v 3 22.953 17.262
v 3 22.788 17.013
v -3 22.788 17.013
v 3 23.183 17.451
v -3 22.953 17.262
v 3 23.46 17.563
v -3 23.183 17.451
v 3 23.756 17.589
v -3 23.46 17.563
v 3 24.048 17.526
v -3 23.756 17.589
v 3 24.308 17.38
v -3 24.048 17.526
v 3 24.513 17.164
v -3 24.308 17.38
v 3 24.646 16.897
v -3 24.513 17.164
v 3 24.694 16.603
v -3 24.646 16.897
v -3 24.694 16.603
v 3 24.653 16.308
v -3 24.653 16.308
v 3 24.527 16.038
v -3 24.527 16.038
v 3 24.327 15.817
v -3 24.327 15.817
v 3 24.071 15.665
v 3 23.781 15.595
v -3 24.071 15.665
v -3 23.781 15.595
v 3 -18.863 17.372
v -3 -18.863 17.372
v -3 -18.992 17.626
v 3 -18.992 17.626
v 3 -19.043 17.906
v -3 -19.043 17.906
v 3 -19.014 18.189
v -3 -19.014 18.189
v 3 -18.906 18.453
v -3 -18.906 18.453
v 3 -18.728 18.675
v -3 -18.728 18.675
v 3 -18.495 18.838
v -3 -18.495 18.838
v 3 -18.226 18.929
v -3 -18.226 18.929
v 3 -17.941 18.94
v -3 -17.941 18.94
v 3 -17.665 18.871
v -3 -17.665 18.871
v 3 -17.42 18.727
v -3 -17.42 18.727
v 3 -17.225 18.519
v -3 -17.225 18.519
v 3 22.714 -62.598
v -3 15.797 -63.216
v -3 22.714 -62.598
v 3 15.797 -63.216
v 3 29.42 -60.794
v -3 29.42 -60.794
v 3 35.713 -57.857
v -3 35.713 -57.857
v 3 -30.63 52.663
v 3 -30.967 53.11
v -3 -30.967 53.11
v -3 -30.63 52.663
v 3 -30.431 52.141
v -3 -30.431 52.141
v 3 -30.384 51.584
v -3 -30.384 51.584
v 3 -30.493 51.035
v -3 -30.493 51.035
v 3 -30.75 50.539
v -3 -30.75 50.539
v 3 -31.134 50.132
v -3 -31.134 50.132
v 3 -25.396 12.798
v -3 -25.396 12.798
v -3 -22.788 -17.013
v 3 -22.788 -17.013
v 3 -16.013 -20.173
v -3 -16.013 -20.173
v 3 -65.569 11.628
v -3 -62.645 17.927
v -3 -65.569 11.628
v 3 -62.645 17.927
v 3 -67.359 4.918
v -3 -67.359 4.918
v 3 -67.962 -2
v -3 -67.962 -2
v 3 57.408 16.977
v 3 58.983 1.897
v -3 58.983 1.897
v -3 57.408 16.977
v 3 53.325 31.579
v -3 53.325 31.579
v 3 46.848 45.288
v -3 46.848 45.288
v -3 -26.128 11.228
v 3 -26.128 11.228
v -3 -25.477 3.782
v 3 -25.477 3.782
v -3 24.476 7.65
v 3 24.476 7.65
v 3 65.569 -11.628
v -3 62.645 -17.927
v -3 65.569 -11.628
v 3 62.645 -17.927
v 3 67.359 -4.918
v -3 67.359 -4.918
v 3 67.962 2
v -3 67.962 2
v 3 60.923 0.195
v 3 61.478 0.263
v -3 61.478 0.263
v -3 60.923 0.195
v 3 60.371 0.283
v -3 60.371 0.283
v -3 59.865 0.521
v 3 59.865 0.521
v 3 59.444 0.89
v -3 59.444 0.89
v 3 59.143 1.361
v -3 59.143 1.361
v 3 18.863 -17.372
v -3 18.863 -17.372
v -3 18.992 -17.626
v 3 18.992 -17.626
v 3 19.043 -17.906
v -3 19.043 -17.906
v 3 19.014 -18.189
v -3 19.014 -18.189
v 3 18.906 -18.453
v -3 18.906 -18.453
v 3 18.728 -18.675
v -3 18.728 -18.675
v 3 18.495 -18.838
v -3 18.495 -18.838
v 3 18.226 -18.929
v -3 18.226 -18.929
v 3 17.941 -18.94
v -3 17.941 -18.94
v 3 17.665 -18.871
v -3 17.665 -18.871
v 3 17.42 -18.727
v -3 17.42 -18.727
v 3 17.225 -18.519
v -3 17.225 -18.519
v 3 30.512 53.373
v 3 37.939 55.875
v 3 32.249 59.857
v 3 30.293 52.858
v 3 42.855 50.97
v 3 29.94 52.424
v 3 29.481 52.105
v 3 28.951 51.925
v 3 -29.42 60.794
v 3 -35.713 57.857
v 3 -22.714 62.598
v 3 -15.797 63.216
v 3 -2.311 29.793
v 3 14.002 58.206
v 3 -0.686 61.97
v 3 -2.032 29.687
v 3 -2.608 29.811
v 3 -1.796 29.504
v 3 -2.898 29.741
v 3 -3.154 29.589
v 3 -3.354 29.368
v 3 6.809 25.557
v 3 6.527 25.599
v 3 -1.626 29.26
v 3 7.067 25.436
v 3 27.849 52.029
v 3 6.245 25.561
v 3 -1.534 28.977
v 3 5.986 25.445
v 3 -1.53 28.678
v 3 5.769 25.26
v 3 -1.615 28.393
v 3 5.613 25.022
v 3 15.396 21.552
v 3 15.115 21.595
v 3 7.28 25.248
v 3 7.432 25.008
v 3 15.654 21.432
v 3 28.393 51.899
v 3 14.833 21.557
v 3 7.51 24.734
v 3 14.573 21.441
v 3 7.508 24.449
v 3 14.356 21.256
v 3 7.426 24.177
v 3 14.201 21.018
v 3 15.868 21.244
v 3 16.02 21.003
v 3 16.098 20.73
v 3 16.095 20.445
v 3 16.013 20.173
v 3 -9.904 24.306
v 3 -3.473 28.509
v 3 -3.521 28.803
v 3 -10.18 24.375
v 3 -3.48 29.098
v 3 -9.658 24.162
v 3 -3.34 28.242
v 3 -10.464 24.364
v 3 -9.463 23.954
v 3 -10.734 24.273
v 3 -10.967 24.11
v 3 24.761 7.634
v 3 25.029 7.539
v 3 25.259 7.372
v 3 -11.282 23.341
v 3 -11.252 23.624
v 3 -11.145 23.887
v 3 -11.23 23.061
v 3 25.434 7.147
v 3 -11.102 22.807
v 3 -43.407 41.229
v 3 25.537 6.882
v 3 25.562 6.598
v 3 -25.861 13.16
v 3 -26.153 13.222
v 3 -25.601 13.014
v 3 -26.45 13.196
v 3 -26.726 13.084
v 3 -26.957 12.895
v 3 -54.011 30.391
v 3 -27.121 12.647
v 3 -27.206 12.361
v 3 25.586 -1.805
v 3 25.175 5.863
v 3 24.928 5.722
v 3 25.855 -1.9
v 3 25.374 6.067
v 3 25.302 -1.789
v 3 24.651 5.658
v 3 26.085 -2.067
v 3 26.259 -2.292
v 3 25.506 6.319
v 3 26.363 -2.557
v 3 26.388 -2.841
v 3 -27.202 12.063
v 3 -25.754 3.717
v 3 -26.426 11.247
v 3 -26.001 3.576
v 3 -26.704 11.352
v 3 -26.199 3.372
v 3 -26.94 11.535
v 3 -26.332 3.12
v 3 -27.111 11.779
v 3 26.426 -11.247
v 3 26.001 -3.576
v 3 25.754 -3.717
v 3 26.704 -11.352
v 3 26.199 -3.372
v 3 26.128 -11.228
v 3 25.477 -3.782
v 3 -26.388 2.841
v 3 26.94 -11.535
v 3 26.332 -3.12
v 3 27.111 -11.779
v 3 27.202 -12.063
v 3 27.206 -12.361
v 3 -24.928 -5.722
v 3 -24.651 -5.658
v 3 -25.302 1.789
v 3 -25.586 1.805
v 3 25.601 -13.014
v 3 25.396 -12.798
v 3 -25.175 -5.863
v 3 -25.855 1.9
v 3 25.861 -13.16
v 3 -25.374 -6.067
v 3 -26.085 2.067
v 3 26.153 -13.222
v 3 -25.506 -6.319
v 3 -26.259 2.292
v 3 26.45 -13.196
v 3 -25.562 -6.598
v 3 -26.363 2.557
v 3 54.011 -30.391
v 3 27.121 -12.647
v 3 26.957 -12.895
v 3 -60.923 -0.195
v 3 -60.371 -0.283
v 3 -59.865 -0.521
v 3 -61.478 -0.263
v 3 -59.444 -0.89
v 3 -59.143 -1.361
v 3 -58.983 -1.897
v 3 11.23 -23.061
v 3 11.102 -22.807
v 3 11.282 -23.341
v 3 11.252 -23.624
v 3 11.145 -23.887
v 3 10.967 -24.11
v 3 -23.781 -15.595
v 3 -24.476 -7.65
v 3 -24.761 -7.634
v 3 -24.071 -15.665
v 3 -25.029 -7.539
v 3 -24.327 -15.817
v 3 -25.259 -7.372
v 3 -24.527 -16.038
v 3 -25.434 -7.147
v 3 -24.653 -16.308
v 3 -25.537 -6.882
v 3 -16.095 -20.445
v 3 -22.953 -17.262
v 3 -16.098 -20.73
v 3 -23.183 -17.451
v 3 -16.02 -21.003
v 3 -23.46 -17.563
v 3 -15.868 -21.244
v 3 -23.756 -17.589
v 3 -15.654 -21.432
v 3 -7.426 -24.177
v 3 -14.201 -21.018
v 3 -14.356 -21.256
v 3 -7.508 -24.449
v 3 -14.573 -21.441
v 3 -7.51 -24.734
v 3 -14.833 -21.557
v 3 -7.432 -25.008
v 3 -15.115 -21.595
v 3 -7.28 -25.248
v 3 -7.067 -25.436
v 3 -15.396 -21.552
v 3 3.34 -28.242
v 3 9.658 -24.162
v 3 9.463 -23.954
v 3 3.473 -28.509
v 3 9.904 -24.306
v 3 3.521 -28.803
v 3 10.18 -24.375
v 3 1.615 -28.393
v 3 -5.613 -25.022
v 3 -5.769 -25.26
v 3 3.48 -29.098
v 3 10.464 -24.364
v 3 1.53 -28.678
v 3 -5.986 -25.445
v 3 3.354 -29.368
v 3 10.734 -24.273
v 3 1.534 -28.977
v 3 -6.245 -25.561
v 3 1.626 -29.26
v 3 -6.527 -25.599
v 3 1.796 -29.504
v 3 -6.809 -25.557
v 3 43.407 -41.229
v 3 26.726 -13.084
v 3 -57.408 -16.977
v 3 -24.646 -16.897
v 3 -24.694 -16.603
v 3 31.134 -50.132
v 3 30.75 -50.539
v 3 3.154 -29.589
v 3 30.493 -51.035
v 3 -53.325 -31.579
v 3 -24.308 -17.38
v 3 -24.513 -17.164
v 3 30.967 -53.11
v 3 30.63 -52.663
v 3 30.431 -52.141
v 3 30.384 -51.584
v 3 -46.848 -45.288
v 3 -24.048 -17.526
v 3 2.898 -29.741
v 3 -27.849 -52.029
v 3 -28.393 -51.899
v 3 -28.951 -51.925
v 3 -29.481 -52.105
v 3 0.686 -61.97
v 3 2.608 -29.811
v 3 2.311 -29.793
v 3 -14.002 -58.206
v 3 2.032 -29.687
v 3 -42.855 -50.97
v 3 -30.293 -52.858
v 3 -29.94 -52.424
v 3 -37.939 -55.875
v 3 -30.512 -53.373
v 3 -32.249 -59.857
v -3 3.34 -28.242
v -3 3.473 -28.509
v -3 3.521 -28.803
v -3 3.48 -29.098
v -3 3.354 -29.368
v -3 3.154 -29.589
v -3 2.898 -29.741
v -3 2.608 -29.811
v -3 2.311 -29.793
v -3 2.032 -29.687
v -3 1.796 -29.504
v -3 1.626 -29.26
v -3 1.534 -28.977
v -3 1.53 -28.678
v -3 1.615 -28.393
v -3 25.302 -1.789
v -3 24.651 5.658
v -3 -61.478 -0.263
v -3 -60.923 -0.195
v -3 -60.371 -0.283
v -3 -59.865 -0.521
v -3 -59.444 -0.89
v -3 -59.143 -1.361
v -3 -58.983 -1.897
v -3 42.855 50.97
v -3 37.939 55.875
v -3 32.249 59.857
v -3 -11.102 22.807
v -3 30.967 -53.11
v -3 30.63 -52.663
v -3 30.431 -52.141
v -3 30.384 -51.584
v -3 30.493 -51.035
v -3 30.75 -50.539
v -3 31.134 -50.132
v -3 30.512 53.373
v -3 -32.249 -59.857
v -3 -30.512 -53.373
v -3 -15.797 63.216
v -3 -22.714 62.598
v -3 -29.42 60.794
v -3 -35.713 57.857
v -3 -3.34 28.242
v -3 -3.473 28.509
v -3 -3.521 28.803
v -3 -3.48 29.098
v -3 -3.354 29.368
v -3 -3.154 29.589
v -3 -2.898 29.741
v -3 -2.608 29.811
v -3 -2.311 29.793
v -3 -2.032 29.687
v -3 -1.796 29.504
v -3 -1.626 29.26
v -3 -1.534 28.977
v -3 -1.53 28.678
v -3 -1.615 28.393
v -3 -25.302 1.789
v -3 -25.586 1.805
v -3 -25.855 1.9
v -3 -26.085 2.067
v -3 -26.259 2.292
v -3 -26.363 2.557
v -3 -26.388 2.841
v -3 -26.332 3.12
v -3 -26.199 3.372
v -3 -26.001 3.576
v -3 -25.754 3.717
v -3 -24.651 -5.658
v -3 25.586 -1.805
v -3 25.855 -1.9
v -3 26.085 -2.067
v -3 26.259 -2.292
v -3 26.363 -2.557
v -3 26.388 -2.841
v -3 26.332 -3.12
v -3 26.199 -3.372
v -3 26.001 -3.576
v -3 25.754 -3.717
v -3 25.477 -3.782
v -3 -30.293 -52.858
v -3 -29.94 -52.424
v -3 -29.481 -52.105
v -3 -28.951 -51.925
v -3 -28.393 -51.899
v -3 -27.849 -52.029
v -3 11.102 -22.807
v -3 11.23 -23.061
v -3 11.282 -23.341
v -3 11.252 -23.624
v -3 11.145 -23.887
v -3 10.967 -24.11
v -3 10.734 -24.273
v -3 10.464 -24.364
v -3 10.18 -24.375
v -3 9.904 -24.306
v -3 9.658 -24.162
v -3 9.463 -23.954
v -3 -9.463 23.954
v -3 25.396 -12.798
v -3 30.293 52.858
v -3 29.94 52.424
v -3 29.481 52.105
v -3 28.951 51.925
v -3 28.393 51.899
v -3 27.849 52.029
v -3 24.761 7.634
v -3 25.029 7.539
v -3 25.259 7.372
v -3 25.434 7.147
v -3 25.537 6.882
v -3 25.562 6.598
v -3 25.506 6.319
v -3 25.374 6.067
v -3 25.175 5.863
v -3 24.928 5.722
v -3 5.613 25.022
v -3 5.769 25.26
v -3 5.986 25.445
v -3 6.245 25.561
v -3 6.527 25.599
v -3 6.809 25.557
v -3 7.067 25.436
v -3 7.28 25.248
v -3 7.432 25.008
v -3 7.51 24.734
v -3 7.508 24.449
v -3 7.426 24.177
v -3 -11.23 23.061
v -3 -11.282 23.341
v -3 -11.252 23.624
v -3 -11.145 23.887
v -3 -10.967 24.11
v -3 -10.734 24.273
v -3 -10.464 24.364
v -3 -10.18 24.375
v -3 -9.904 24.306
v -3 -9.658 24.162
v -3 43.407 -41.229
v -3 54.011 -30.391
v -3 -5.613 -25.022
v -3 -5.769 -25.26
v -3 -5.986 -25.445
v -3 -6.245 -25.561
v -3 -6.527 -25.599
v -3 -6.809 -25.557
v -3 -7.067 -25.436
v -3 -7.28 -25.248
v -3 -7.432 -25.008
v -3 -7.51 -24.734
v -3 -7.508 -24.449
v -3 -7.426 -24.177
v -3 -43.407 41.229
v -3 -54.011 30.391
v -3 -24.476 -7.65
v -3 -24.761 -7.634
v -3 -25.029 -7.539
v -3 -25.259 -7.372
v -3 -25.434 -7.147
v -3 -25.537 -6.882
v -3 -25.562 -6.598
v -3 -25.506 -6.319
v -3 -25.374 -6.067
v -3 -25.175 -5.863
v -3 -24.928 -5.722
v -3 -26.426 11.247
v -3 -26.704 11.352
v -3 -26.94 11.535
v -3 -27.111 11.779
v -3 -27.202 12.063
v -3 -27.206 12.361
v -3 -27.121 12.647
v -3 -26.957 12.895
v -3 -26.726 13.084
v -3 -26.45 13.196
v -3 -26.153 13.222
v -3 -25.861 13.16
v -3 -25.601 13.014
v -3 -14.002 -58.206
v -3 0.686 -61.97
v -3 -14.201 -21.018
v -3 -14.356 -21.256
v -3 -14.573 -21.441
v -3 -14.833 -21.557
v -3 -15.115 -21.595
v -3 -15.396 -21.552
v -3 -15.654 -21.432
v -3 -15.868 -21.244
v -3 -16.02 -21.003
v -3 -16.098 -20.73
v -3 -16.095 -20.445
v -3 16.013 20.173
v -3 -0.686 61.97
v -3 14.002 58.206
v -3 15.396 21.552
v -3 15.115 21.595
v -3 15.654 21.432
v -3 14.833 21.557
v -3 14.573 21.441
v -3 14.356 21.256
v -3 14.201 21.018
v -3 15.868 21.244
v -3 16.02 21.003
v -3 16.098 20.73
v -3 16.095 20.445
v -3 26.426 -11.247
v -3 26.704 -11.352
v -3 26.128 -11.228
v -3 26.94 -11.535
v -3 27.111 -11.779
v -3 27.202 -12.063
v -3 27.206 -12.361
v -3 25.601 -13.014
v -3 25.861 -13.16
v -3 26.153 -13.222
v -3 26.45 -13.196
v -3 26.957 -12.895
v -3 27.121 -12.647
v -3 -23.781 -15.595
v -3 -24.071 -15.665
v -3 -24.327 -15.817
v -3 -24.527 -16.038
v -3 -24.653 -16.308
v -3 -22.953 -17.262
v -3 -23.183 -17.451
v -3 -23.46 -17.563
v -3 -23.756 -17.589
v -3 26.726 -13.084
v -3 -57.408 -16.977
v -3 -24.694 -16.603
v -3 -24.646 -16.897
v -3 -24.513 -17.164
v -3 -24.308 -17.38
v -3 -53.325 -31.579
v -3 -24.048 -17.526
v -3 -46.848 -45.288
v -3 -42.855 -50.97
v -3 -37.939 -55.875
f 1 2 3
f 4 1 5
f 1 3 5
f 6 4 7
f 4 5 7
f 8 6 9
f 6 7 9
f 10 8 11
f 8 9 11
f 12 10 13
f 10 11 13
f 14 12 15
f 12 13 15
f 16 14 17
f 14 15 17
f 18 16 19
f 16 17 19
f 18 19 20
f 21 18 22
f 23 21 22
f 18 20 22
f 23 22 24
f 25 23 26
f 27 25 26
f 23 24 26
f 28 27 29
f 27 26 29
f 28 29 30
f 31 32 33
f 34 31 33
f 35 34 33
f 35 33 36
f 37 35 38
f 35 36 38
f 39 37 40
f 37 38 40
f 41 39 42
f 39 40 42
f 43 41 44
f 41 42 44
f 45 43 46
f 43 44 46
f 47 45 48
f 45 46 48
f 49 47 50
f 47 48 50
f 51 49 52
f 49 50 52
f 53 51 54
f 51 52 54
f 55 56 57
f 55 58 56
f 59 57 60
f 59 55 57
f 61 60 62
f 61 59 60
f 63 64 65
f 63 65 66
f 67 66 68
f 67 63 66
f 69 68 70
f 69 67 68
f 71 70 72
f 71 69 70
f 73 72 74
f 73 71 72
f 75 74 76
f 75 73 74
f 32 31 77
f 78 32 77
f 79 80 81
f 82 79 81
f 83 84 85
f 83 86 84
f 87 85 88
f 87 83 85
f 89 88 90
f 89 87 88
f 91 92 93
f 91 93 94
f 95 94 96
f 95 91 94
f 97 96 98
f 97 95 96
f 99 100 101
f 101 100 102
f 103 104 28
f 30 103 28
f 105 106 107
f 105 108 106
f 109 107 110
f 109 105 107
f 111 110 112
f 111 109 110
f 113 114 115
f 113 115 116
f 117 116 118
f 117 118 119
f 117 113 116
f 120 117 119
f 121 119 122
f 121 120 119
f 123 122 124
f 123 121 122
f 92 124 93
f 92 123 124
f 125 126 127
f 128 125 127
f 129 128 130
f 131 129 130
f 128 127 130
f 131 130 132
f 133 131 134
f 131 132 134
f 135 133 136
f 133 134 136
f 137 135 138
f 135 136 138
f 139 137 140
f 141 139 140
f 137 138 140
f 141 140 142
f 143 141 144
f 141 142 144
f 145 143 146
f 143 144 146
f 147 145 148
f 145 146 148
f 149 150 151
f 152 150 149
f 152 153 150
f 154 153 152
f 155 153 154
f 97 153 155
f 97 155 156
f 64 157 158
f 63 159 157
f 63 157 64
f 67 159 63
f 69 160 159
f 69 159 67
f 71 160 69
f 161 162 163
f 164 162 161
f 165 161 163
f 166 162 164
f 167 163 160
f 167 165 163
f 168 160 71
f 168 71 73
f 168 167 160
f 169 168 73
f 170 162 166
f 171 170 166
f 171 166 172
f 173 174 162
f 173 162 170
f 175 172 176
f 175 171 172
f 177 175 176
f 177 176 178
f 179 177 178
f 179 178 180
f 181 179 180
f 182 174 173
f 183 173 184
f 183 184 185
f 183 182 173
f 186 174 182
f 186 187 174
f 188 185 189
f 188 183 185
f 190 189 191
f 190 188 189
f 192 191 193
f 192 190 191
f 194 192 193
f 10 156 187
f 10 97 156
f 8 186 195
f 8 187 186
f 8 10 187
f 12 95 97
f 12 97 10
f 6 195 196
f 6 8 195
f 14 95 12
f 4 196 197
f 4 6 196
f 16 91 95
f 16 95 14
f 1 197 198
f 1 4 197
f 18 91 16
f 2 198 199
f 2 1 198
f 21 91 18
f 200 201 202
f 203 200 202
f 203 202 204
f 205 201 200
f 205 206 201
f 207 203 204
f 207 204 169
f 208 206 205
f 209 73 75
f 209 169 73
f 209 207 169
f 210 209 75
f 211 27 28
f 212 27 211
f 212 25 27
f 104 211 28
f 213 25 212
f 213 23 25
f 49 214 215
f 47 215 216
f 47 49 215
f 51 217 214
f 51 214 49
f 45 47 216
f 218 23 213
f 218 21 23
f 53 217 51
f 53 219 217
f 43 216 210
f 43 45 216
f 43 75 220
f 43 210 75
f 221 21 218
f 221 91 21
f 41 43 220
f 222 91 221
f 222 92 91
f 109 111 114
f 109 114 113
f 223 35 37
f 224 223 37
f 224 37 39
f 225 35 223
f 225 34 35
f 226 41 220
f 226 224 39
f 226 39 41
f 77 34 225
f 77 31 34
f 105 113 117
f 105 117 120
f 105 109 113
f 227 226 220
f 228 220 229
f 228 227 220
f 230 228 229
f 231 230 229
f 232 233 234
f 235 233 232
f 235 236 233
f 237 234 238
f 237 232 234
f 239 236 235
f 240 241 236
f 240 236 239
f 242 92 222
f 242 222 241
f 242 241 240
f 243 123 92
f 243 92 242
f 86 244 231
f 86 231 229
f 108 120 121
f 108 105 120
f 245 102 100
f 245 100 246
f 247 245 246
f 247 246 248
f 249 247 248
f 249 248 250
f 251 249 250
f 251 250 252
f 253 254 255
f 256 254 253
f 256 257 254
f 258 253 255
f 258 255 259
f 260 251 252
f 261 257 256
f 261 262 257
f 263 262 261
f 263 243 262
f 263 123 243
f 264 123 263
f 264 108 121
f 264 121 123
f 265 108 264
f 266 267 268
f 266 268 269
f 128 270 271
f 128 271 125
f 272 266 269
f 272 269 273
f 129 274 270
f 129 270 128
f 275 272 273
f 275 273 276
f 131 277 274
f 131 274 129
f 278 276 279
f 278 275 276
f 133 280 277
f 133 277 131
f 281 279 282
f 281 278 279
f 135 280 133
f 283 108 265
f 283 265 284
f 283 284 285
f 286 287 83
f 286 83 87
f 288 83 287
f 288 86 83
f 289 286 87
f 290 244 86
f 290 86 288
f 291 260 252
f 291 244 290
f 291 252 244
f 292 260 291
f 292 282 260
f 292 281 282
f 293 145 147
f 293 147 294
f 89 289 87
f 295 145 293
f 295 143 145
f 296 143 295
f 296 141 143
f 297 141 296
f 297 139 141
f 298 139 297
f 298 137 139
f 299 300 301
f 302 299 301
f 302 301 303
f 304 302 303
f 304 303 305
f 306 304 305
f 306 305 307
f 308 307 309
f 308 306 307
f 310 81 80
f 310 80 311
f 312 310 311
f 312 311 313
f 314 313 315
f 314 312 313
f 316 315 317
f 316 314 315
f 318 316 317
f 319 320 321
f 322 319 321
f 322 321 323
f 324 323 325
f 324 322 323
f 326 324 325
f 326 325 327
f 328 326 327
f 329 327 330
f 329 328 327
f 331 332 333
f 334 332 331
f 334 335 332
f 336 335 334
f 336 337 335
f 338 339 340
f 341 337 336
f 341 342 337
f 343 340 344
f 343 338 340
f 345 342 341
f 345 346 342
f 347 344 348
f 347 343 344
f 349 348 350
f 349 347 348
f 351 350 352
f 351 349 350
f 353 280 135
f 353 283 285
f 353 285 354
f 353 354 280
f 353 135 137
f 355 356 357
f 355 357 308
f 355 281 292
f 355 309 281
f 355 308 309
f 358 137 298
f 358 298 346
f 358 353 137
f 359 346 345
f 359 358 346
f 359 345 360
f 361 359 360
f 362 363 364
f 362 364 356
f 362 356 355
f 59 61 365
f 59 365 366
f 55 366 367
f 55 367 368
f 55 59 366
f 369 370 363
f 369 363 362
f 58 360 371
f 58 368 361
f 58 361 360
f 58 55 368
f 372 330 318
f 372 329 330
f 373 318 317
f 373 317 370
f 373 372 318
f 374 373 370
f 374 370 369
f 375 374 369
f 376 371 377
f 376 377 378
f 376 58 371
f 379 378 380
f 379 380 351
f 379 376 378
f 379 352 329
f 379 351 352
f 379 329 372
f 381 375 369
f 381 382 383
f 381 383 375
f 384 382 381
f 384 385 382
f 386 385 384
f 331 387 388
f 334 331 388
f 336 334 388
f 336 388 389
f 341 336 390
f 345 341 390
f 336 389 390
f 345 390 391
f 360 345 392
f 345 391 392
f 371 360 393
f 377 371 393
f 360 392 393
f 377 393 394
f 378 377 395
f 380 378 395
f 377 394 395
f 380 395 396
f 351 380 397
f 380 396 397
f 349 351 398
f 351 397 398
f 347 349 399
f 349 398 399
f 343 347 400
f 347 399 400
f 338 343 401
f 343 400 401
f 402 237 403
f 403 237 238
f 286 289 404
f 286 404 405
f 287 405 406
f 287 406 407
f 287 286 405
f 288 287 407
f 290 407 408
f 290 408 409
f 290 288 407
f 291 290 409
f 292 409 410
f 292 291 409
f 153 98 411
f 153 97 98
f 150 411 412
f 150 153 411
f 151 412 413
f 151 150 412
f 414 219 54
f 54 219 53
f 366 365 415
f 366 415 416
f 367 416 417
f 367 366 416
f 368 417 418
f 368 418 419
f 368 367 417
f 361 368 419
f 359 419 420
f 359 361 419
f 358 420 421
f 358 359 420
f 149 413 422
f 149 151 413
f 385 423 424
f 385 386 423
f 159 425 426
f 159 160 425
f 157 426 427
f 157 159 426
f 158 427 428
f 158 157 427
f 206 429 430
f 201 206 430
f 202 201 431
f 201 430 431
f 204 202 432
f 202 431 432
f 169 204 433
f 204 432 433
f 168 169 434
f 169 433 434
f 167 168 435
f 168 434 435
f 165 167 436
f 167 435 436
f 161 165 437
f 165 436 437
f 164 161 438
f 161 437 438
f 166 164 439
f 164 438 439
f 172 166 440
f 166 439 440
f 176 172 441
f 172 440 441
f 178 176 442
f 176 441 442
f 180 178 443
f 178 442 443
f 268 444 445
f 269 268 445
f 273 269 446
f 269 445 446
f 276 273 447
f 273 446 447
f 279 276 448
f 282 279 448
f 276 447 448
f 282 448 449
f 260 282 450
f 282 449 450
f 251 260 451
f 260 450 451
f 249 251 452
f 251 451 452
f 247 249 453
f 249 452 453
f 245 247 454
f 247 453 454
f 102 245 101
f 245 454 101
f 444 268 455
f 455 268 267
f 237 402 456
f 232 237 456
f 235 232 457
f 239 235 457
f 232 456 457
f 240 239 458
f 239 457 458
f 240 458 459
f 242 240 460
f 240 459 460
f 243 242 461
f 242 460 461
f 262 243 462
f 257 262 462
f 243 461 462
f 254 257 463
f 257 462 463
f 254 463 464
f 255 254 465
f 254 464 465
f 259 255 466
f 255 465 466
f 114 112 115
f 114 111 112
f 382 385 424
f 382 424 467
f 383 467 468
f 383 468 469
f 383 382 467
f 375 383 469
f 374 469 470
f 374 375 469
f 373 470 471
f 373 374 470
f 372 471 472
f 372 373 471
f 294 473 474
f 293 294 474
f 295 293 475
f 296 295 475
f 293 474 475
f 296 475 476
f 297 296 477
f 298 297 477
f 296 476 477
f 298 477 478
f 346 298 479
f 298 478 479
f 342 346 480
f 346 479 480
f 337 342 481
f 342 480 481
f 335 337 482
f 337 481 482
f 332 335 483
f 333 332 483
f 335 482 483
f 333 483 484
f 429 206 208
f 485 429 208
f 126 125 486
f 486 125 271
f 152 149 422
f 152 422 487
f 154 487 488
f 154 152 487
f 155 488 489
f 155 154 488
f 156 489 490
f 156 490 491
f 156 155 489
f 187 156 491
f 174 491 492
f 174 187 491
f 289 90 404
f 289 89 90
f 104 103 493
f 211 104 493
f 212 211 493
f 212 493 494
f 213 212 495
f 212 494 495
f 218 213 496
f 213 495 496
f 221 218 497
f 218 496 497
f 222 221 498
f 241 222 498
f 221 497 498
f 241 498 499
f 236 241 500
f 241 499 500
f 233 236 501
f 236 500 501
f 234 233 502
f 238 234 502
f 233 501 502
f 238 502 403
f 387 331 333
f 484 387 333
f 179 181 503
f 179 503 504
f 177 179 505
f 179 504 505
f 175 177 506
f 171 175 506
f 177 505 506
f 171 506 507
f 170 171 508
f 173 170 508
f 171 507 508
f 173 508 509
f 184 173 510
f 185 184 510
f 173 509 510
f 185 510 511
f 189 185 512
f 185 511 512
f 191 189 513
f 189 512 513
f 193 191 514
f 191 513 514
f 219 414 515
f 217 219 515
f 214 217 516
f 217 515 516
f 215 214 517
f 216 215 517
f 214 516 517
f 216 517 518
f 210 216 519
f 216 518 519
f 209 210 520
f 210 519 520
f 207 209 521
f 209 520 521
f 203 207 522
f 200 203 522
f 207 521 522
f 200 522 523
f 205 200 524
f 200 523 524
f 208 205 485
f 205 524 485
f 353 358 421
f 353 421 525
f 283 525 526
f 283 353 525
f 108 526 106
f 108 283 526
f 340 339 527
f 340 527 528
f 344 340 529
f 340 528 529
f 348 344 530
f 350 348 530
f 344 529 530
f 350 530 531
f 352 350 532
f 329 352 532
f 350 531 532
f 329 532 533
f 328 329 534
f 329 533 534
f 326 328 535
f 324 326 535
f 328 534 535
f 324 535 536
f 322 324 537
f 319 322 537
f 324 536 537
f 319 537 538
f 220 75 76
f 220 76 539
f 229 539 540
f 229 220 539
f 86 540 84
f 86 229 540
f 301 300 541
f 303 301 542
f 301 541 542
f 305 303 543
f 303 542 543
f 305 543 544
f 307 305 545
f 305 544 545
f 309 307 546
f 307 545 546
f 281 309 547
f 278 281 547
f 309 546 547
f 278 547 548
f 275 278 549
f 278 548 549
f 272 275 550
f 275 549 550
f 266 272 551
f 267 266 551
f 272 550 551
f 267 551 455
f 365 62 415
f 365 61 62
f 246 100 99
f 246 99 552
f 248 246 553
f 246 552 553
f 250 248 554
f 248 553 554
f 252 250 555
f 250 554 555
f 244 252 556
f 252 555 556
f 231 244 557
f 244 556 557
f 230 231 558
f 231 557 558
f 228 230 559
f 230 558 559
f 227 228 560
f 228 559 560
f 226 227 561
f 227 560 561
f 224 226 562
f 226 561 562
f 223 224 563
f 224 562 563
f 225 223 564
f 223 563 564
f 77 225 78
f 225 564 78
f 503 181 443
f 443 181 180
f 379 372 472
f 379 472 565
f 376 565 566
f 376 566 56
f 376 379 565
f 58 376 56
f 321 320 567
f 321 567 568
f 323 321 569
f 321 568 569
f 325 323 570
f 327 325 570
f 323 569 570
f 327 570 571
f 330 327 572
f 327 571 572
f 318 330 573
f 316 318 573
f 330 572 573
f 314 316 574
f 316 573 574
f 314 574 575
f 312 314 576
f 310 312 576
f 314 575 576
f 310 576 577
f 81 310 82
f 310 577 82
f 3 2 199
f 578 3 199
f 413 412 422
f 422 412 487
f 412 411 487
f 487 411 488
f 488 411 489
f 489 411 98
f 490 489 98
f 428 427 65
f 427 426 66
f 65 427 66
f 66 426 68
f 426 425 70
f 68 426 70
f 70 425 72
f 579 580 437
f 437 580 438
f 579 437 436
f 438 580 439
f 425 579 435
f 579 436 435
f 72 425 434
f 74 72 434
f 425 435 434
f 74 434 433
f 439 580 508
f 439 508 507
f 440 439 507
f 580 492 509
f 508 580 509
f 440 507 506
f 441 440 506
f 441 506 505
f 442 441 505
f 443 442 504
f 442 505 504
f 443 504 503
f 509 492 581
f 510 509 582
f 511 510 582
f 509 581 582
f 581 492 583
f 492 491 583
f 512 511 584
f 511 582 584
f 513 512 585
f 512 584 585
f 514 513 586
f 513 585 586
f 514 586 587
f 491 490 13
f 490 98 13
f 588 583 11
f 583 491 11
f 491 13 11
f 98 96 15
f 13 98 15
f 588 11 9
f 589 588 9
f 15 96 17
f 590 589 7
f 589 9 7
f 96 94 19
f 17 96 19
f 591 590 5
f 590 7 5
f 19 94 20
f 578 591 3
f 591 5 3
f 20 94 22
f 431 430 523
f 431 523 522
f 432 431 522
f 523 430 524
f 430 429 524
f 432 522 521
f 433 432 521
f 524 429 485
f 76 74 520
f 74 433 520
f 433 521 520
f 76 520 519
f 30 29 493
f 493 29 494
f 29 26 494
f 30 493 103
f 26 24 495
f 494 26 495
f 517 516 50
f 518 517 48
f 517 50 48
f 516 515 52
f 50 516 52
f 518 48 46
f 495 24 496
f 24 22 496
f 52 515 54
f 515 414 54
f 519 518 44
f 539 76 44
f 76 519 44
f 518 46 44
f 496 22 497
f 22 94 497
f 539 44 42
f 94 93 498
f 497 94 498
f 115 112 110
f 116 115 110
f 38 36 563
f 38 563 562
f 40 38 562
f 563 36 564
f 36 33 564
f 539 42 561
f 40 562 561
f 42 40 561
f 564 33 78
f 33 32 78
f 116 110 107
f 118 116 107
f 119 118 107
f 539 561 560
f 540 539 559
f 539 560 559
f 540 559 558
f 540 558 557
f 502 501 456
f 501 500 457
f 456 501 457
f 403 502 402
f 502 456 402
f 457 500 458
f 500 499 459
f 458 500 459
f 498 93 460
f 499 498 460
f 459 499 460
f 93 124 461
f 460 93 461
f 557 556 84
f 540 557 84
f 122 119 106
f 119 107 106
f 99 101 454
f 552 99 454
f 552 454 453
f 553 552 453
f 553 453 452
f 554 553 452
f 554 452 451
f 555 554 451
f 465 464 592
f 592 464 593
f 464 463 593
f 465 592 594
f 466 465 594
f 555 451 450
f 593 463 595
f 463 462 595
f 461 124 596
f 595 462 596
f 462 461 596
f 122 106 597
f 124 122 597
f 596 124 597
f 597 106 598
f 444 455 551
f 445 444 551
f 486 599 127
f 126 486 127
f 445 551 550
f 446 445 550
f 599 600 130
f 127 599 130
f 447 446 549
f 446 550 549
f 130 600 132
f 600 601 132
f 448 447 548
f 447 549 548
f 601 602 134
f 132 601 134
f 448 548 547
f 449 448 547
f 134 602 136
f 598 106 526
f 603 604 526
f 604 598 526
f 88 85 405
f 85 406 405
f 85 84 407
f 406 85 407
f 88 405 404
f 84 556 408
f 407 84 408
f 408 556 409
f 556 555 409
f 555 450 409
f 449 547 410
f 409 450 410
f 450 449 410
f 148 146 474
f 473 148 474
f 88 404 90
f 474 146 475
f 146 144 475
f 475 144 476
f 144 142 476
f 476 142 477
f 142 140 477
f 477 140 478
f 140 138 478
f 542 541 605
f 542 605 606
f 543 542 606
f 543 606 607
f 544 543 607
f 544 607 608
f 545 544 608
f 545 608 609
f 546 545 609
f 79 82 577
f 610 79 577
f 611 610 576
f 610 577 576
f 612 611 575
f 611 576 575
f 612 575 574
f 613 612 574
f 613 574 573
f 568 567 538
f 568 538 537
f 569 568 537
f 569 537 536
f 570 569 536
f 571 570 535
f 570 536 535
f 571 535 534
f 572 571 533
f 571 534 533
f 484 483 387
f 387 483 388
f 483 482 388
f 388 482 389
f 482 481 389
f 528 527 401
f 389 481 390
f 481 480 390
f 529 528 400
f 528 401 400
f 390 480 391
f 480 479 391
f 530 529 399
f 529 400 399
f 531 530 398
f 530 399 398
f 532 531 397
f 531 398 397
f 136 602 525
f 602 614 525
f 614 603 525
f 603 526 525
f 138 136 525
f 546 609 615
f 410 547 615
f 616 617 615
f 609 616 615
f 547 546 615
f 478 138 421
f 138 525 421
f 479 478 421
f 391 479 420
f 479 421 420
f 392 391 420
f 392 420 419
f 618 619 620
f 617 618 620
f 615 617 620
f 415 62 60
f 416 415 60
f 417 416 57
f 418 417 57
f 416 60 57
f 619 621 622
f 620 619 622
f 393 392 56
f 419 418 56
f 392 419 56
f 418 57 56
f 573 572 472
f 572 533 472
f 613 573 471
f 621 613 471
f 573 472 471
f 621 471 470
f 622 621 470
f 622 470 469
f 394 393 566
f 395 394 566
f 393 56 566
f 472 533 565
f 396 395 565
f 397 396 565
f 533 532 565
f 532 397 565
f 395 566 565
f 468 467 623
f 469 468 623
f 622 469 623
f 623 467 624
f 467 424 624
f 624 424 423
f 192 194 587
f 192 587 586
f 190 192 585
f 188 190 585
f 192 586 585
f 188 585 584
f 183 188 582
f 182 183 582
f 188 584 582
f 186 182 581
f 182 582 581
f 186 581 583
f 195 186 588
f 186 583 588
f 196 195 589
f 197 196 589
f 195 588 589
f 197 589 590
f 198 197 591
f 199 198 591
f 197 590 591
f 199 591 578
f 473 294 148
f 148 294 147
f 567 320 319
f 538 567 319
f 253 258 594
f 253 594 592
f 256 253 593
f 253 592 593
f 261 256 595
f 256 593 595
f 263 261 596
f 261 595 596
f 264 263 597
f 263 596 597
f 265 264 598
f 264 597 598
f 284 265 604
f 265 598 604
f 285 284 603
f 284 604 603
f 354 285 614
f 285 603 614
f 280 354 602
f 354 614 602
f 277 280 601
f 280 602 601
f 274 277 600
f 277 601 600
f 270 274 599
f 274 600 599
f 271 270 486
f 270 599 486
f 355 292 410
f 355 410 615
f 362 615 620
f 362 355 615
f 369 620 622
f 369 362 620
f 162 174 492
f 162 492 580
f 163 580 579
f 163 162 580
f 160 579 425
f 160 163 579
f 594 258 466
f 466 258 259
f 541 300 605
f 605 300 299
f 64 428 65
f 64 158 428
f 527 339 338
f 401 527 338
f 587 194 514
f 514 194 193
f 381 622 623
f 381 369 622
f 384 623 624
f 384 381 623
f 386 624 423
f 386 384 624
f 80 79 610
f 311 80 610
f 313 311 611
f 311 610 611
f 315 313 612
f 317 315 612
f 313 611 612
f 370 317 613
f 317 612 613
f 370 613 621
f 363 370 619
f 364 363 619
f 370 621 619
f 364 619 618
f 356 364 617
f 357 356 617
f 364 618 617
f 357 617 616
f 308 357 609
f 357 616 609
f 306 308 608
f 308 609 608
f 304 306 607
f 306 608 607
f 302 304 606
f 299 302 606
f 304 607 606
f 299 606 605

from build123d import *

# Parameters (mm, degrees)
SKETCH1_R                = 59
EXTRUDE1_DEPTH           = 3
EXTRUDE2_DEPTH           = 3
CIRPATTERN1_COUNT        = 6
F_2_0_2_DIAMETER_HOLE1_D = 2
F_2_0_2_DIAMETER_HOLE3_D = 2
F_2_0_2_DIAMETER_HOLE4_D = 2
CIRPATTERN2_COUNT        = 6
CIRPATTERN3_COUNT        = 6


with BuildPart() as part:
    # Sketch1 → Extrude1 (new, symmetric)
    with BuildSketch(Plane(origin=(0, 0, 0), x_dir=(0, 0, -1), z_dir=(1, 0, 0))):
        Circle(SKETCH1_R)
        Polygon((28.815179183, 2.521001516), (12.224338236, 26.215177945), (-16.590840947, 23.694176429), (-28.815179183, -2.521001516), (-12.224338236, -26.215177945), (16.590840947, -23.694176429), align=None, mode=Mode.SUBTRACT)
    extrude(amount=EXTRUDE1_DEPTH, both=True)

    # Sketch2 → Extrude2 (add, symmetric)
    with BuildSketch(Plane(origin=(0, 0, 0), x_dir=(0, 0, -1), z_dir=(1, 0, 0))):
        with BuildLine():
            Line((-2, 67.961805723), (-0.262709442, 61.478149092))
            ThreePointArc((-0.262709442, 61.478149092), (-0.58620663, 59.77173183), (-2.122608272, 58.961805723))
            ThreePointArc((-2.122608272, 58.961805723), (28.679663449, 51.560419941), (51.21368579, 29.294340542))
            ThreePointArc((51.21368579, 29.294340542), (36.791707484, 48.186627241), (17.927108603, 62.644803614))
            ThreePointArc((17.927108603, 62.644803614), (8.312130826, 66.609702921), (-2, 67.961805723))
        make_face()
    extrude2 = extrude(amount=EXTRUDE2_DEPTH, both=True)

    # CirPattern1: Extrude2 ×6 about axis
    cirpattern1_axis = Axis((0, 0, 0), (1, 0, 0))
    for i in range(1, CIRPATTERN1_COUNT):
        add(extrude2.rotate(cirpattern1_axis, i * 360 / CIRPATTERN1_COUNT))

    # Ø2.0 (2) Diameter Hole1 (through all)
    with Locations(Plane(origin=(3, 0, 0), x_dir=(0, 0, -1), z_dir=(1, 0, 0))):
        with Locations((12.224338236, 26.215177945), (28.815179183, 2.521001516), (16.590840947, -23.694176429), (-12.224338236, -26.215177945), (-28.815179183, -2.521001516), (-16.590840947, 23.694176429)):
            Hole(F_2_0_2_DIAMETER_HOLE1_D / 2)

    # Ø2.0 (2) Diameter Hole3 (through all)
    with Locations(Plane(origin=(3, 0, 0), x_dir=(0, 0, -1), z_dir=(1, 0, 0))):
        with Locations((17.945810697, 18.044068454)):
            f_2_0_2_diameter_hole3 = Hole(F_2_0_2_DIAMETER_HOLE3_D / 2)

    # Ø2.0 (2) Diameter Hole4 (through all)
    with Locations(Plane(origin=(3, 0, 0), x_dir=(0, 0, -1), z_dir=(1, 0, 0))):
        with Locations((23.38049494, 10.282534985)):
            f_2_0_2_diameter_hole4 = Hole(F_2_0_2_DIAMETER_HOLE4_D / 2)

    # CirPattern2: Ø2.0 (2) Diameter Hole3 ×6 about axis
    cirpattern2_axis = Axis((0, 0, 0), (1, 0, 0))
    for i in range(1, CIRPATTERN2_COUNT):
        add(f_2_0_2_diameter_hole3.rotate(cirpattern2_axis, i * 360 / CIRPATTERN2_COUNT), mode=Mode.SUBTRACT)

    # CirPattern3: Ø2.0 (2) Diameter Hole4 ×6 about axis
    cirpattern3_axis = Axis((0, 0, 0), (1, 0, 0))
    for i in range(1, CIRPATTERN3_COUNT):
        add(f_2_0_2_diameter_hole4.rotate(cirpattern3_axis, i * 360 / CIRPATTERN3_COUNT), mode=Mode.SUBTRACT)


solid = part.part
